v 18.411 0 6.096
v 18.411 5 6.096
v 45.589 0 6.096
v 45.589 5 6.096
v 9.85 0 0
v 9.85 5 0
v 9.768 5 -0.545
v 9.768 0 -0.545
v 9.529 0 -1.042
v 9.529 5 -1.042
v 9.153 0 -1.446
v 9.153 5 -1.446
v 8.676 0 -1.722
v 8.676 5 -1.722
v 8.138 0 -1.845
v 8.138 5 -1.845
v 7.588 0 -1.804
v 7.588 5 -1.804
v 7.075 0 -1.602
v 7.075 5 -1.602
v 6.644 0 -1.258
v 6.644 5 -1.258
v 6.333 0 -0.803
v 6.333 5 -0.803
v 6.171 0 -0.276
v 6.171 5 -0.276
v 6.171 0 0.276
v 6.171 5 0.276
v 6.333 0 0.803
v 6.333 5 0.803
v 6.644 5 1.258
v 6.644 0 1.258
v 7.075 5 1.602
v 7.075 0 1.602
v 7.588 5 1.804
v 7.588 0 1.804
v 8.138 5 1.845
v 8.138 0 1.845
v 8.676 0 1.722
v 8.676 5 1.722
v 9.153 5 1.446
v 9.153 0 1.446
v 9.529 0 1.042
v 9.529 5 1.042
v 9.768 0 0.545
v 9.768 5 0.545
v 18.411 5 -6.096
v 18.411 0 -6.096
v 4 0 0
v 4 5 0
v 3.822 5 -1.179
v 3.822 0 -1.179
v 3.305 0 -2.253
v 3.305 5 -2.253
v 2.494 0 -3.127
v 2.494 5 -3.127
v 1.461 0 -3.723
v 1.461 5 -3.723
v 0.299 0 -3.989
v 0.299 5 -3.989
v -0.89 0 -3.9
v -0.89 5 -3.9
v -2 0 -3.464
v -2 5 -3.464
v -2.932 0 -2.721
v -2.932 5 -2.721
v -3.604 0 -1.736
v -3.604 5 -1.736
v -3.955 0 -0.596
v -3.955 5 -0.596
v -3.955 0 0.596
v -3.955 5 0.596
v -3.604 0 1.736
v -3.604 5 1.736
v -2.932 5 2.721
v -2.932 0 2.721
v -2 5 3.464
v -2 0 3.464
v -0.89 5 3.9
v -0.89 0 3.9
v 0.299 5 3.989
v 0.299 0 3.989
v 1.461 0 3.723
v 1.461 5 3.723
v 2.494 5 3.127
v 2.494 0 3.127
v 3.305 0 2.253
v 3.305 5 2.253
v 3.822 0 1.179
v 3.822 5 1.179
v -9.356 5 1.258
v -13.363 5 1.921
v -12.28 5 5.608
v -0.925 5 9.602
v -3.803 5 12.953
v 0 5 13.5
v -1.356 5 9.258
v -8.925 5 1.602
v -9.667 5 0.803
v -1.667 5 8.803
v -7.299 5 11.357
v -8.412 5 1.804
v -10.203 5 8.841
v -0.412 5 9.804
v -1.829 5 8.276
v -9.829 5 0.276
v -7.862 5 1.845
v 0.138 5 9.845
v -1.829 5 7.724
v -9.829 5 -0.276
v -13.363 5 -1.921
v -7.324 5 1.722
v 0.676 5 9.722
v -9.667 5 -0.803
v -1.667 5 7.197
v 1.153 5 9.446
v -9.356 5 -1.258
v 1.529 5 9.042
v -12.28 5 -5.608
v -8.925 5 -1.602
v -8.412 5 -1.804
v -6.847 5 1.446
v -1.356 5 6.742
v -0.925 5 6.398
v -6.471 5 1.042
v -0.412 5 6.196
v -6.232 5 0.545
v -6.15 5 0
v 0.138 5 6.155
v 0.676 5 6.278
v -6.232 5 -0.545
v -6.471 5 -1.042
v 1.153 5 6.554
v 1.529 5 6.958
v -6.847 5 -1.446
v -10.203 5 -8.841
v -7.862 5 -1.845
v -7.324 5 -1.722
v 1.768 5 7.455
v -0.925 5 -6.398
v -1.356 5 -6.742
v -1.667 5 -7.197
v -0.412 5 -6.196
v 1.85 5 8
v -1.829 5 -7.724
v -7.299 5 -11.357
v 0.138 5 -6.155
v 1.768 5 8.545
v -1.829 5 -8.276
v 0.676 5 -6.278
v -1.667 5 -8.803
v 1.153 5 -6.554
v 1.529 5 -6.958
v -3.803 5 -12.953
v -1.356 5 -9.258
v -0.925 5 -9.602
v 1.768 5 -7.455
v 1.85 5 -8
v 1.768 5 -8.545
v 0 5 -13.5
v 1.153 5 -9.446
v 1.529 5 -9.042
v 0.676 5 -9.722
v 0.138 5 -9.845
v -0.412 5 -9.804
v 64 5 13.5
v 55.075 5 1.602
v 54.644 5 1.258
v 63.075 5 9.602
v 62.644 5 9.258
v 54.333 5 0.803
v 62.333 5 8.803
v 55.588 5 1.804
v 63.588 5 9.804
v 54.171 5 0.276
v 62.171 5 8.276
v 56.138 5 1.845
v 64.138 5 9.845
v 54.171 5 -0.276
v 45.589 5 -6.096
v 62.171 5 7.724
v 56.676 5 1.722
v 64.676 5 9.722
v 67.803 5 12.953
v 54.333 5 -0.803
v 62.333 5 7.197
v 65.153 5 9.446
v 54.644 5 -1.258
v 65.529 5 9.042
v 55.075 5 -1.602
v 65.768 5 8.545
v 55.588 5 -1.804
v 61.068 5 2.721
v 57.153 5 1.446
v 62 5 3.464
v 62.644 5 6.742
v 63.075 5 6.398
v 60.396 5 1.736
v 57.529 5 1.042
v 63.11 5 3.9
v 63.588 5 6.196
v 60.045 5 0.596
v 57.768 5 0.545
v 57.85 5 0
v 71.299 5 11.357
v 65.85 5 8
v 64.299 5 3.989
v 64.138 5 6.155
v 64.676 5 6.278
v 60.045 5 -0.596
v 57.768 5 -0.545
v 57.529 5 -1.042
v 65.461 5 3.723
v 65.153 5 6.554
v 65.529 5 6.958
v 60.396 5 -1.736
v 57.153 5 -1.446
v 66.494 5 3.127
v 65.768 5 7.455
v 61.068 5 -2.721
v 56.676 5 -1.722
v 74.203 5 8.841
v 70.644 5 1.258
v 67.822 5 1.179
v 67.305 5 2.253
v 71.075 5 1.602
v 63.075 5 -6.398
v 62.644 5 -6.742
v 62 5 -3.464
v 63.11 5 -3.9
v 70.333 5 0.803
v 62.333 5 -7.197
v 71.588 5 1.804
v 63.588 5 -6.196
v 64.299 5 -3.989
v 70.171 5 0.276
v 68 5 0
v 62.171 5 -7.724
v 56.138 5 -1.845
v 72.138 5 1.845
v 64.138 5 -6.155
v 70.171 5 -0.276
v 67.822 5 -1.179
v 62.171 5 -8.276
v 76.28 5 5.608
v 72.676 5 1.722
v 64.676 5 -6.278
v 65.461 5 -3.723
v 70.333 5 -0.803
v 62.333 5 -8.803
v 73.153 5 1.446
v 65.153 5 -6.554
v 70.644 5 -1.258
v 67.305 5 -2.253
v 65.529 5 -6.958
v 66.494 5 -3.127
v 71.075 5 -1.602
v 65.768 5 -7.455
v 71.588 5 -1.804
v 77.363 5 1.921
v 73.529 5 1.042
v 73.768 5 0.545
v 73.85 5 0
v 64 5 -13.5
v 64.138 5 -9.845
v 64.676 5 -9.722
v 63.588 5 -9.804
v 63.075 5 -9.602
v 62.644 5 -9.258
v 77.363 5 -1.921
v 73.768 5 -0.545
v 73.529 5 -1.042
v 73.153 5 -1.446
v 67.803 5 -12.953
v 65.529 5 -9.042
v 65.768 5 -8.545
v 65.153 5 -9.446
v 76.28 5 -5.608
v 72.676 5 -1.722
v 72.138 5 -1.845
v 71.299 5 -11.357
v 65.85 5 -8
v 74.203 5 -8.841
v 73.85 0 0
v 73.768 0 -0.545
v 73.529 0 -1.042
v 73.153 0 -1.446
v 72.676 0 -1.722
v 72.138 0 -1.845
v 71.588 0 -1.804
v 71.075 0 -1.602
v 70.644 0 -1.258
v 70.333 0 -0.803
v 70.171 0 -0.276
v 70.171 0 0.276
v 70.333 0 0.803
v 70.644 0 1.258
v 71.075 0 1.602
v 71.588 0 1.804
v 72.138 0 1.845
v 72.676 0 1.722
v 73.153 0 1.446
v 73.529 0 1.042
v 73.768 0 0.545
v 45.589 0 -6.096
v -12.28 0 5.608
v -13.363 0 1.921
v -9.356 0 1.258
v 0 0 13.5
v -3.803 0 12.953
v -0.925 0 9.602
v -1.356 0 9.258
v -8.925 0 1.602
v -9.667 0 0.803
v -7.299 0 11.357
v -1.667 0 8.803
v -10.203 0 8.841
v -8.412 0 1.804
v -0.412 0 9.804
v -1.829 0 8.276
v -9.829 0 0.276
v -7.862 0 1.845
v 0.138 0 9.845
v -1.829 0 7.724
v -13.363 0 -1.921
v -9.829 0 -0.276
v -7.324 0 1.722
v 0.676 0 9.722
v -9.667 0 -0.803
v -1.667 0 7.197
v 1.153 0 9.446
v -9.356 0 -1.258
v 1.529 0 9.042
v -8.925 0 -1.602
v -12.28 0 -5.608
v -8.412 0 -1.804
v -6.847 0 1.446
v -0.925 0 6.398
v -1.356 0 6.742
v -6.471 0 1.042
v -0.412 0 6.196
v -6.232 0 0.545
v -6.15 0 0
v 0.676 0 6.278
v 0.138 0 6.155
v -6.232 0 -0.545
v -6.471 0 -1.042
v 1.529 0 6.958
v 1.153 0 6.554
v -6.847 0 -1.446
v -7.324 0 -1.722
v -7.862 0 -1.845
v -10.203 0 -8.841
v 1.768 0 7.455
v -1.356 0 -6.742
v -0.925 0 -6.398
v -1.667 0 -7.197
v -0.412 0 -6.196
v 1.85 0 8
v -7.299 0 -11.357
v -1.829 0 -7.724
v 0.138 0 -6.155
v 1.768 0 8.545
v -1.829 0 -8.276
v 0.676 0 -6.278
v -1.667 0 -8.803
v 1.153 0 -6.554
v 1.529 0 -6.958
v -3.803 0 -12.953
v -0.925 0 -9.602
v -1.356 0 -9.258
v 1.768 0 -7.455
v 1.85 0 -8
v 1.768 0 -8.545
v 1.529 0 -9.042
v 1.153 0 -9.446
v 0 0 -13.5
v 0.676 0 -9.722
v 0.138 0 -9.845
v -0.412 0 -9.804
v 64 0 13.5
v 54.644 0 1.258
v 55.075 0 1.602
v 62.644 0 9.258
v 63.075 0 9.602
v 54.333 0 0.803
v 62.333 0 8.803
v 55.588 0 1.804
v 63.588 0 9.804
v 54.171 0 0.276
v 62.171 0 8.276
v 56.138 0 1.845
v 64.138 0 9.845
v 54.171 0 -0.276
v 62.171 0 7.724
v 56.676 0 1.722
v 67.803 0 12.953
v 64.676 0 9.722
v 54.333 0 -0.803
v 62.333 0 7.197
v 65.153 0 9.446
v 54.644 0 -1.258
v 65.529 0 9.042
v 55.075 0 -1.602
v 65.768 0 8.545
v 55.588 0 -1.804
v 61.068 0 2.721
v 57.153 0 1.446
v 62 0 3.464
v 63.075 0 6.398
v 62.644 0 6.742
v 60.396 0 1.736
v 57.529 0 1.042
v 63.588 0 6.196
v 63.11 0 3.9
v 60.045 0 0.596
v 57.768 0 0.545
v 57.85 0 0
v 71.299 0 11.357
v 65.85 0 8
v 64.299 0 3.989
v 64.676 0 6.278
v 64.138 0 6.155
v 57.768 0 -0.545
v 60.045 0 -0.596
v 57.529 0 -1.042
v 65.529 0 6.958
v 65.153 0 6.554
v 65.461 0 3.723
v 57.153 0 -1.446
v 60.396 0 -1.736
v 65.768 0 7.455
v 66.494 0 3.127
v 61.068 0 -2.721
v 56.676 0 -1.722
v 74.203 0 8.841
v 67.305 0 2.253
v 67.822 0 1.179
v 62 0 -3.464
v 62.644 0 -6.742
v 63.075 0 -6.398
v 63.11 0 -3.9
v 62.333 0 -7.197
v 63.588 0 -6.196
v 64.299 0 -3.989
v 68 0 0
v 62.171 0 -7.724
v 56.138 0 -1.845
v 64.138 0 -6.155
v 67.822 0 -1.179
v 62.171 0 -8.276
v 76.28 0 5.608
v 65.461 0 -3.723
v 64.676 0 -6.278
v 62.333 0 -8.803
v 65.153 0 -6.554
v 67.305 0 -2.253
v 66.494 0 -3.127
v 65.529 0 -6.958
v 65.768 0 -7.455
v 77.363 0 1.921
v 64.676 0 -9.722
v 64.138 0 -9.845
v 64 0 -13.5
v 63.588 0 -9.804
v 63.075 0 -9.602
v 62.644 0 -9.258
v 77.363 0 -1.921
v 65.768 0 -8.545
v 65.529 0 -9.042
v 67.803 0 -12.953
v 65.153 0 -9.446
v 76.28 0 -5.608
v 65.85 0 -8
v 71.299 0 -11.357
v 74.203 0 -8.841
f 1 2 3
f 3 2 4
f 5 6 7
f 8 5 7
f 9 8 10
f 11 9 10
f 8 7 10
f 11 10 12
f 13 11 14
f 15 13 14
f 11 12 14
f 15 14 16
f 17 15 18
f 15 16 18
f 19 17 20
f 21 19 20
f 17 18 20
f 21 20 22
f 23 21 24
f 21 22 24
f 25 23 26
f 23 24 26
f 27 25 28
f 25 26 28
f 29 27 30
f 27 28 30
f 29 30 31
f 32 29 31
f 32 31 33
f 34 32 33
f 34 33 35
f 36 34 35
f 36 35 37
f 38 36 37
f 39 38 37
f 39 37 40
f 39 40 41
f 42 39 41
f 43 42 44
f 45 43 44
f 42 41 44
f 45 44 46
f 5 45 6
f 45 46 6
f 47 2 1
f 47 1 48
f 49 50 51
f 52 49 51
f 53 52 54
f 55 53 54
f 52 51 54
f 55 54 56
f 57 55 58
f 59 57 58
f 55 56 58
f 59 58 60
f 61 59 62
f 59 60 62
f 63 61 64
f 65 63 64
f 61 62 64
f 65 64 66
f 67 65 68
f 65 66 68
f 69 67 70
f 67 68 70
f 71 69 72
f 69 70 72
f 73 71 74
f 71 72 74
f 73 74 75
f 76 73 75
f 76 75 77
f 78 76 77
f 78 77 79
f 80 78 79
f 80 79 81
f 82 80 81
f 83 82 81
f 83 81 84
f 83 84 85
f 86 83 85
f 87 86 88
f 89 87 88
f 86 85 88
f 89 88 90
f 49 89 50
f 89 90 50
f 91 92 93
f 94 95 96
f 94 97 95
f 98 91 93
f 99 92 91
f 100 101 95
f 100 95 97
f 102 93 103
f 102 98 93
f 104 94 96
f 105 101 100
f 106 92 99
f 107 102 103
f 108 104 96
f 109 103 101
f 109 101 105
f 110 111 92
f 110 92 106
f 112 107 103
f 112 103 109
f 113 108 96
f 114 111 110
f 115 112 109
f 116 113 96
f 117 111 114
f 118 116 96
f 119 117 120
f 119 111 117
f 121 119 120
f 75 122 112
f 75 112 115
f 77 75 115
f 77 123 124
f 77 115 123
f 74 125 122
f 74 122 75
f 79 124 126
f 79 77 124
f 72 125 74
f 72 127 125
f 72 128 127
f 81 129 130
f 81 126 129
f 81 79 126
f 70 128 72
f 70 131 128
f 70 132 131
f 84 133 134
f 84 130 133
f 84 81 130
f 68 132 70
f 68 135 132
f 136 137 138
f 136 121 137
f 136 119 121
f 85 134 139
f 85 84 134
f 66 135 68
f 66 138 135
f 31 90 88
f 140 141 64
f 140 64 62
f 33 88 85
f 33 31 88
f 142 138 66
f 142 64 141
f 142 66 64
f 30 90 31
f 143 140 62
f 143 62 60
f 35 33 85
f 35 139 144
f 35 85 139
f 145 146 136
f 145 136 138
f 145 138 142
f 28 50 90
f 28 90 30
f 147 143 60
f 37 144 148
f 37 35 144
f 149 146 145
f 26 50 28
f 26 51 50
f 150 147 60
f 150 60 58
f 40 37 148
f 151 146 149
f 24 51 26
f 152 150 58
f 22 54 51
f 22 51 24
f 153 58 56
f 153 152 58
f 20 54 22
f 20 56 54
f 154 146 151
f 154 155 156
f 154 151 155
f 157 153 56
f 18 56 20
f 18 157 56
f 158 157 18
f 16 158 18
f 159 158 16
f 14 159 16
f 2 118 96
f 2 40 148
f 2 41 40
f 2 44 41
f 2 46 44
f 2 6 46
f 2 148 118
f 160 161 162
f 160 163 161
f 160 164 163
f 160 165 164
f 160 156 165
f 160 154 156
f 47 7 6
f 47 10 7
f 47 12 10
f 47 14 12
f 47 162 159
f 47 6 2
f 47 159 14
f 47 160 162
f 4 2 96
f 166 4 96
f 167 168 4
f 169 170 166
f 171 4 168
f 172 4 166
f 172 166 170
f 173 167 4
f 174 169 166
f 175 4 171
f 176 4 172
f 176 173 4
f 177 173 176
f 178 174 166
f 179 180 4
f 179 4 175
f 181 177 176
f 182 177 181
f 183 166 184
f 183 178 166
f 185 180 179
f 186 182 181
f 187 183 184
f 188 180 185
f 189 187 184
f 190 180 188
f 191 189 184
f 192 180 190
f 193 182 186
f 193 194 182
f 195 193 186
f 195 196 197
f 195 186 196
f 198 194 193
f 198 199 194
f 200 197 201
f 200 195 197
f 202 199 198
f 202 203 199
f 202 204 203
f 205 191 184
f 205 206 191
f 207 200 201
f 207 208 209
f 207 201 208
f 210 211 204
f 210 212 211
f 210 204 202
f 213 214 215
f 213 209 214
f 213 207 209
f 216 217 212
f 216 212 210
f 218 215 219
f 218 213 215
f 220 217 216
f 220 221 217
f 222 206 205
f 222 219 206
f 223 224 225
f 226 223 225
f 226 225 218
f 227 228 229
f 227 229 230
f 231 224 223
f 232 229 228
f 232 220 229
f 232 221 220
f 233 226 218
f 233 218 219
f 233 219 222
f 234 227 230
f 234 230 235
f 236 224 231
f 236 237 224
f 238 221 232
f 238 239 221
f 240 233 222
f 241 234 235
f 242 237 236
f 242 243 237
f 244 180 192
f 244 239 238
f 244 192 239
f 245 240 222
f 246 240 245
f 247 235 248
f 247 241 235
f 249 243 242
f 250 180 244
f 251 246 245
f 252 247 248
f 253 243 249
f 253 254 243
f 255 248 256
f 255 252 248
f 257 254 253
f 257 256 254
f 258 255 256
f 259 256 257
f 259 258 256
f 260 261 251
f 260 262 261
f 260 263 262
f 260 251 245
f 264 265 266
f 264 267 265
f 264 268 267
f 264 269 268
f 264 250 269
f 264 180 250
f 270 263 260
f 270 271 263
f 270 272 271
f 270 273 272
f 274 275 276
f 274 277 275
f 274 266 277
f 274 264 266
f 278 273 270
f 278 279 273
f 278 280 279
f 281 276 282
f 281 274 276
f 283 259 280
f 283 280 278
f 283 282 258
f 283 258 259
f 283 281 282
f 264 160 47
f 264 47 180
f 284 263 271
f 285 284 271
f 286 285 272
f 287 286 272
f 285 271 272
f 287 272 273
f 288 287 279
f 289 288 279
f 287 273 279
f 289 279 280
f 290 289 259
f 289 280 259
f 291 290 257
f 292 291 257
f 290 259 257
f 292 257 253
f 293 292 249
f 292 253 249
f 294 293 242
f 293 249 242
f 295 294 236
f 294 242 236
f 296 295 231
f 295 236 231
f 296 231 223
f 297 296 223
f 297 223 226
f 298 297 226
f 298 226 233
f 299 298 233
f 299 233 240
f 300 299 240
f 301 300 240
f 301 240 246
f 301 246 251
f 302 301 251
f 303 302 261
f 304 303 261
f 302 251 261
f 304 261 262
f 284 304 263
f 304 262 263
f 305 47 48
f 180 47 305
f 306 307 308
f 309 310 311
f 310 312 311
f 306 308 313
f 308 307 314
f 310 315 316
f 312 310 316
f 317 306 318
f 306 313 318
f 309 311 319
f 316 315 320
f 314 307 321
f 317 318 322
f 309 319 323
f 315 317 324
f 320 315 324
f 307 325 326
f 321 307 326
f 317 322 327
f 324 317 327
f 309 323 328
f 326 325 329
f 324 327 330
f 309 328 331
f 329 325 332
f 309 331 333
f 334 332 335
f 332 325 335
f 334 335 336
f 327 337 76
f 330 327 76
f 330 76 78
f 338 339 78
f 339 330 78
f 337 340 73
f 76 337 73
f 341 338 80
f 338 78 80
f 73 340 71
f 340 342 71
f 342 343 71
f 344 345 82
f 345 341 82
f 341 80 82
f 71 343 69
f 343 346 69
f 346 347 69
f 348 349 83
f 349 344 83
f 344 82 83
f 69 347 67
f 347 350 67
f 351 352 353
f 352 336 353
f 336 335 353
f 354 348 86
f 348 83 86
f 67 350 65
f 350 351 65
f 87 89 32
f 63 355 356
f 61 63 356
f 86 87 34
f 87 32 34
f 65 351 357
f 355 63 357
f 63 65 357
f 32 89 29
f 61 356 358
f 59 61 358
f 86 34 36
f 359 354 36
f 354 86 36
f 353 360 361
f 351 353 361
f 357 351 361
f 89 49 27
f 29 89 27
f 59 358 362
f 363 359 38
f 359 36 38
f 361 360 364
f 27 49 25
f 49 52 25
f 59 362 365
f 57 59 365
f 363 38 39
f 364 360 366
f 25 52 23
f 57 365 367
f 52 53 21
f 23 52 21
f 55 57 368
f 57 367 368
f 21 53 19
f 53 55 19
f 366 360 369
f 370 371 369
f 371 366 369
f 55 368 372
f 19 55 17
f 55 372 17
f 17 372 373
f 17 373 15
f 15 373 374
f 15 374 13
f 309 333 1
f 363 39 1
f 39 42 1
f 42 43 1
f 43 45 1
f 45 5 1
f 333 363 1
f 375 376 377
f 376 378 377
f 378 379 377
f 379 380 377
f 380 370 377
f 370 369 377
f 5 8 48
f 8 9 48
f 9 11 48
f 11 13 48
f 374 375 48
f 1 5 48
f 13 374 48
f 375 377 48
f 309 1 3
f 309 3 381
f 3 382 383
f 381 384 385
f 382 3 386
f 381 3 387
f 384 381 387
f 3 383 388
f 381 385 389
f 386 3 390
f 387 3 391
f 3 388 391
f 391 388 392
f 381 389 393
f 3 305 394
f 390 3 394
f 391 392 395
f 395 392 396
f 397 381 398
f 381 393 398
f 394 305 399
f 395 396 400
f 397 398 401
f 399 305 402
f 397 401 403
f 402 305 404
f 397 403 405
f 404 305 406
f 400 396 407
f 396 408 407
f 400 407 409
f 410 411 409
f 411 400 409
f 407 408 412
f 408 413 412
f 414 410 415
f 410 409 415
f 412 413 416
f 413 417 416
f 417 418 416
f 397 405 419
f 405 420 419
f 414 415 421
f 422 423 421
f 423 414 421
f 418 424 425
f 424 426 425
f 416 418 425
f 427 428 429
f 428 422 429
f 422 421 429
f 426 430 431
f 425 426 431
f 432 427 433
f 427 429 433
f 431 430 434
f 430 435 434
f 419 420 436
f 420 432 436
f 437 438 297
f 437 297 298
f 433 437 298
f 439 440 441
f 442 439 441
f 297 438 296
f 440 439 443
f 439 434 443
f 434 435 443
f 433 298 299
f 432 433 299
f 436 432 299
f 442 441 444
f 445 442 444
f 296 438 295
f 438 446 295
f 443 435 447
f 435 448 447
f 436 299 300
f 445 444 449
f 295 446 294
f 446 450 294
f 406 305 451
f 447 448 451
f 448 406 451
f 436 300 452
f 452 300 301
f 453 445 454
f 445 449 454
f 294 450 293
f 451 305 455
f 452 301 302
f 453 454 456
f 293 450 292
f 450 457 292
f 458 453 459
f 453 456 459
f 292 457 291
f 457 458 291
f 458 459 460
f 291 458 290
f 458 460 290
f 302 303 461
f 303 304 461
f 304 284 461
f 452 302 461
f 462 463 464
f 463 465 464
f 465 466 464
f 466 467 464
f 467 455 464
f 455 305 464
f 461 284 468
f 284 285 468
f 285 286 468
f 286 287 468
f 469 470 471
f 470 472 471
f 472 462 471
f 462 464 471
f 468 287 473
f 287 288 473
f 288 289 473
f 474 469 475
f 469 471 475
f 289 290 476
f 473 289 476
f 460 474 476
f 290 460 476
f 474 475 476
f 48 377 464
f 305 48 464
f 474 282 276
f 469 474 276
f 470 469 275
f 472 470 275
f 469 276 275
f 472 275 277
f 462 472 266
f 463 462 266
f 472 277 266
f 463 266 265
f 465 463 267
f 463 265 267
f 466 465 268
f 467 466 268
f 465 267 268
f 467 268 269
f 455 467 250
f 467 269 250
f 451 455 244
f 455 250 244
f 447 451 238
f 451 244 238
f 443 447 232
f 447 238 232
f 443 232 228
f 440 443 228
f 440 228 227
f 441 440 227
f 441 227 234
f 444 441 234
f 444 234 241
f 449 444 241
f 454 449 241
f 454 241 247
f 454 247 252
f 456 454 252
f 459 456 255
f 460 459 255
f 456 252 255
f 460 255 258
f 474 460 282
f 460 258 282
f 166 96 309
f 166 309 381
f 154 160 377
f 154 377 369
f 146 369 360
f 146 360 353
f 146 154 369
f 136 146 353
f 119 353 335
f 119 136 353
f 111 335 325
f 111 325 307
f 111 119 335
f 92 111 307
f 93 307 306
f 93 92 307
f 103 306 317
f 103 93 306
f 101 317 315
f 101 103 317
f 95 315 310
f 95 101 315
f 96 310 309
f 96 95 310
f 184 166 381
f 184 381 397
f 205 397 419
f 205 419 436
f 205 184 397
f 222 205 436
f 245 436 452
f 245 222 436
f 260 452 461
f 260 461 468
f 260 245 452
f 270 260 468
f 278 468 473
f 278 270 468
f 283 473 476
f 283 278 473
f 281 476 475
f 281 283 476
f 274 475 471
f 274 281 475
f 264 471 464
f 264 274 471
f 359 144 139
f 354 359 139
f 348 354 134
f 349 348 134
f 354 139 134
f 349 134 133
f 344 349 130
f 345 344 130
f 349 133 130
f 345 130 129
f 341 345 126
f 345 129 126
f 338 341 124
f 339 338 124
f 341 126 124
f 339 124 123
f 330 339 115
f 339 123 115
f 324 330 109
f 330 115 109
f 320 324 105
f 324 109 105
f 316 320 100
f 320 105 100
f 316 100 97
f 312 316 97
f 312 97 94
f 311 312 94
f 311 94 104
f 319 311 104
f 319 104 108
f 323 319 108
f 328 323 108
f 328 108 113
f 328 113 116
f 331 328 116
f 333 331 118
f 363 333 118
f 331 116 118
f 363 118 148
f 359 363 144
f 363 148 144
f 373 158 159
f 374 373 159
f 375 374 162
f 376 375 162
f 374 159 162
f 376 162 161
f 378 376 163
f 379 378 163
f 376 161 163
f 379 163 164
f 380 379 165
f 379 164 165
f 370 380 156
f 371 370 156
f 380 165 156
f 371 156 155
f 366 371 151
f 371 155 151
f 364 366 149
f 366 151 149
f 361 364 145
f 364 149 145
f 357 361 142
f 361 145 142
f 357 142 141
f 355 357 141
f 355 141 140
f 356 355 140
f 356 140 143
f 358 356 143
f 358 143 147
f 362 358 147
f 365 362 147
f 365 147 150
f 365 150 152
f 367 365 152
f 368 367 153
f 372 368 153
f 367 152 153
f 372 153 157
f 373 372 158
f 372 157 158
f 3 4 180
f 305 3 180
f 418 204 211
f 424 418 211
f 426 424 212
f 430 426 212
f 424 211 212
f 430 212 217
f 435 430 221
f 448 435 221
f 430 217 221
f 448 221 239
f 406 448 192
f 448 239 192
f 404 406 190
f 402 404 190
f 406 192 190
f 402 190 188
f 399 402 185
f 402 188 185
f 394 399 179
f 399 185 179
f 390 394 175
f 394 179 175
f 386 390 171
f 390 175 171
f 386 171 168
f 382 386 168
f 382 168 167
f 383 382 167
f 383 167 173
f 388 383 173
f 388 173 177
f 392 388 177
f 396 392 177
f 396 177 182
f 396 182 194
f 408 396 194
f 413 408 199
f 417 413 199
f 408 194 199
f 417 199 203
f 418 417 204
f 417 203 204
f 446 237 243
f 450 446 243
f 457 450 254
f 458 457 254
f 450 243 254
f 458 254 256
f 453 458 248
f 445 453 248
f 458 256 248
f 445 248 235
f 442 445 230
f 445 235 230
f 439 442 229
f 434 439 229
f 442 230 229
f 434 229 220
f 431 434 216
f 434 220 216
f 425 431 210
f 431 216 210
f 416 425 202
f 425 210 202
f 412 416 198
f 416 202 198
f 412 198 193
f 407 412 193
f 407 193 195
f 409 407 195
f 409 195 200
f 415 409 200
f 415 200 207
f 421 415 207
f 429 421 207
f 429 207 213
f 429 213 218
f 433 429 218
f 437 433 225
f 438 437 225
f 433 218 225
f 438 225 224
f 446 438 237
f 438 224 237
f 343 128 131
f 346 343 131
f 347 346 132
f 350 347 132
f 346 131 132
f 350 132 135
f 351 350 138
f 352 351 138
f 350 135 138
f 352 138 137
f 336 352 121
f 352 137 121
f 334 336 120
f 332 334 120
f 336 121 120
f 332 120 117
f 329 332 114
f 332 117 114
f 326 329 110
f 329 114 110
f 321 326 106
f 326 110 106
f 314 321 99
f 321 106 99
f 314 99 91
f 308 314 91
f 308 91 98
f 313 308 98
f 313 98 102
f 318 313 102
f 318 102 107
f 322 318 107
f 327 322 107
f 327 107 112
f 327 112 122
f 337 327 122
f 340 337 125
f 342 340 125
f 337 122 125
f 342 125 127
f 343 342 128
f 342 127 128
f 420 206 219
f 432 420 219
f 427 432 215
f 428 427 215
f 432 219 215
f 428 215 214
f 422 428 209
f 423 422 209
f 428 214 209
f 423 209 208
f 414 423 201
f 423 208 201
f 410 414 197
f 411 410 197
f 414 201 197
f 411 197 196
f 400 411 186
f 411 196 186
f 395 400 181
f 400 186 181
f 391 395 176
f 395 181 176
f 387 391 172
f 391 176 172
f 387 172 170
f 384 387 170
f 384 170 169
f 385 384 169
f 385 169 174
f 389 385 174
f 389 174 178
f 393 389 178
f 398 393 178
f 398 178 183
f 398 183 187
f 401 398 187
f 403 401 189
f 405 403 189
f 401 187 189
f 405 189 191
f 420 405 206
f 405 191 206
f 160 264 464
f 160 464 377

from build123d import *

# Parameters (mm, degrees)
SKETCH1_R           = 1.85
SKETCH1_R_2         = 4
SKETCH1_W           = 27.178
SKETCH1_H           = 12.192
BOSS_EXTRUDE1_DEPTH = 5


with BuildPart() as part:
    # Sketch1 → Boss-Extrude1 (new body)
    with BuildSketch(Plane(origin=(0, 5, 0), x_dir=(1, 0, 0), z_dir=(0, 1, 0))):
        with BuildLine():
            Line((64, 13.5), (0, 13.5))
            ThreePointArc((0, 13.5), (-13.5, 0), (0, -13.5))
            Line((0, -13.5), (64, -13.5))
            ThreePointArc((64, -13.5), (77.5, 0), (64, 13.5))
        make_face()
        with Locations((56, 0)):
            Circle(SKETCH1_R, mode=Mode.SUBTRACT)
        with Locations((64, -8)):
            Circle(SKETCH1_R, mode=Mode.SUBTRACT)
        with Locations((72, 0)):
            Circle(SKETCH1_R, mode=Mode.SUBTRACT)
        with Locations((64, 8)):
            Circle(SKETCH1_R, mode=Mode.SUBTRACT)
        with Locations((64, 0)):
            Circle(SKETCH1_R_2, mode=Mode.SUBTRACT)
        with Locations((-8, 0)):
            Circle(SKETCH1_R, mode=Mode.SUBTRACT)
        with Locations((0, -8)):
            Circle(SKETCH1_R, mode=Mode.SUBTRACT)
        with Locations((8, 0)):
            Circle(SKETCH1_R, mode=Mode.SUBTRACT)
        with Locations((0, 8)):
            Circle(SKETCH1_R, mode=Mode.SUBTRACT)
        Circle(SKETCH1_R_2, mode=Mode.SUBTRACT)
        with Locations((32, 0)):
            Rectangle(SKETCH1_W, SKETCH1_H, mode=Mode.SUBTRACT)
    extrude(amount=-BOSS_EXTRUDE1_DEPTH)


solid = part.part
